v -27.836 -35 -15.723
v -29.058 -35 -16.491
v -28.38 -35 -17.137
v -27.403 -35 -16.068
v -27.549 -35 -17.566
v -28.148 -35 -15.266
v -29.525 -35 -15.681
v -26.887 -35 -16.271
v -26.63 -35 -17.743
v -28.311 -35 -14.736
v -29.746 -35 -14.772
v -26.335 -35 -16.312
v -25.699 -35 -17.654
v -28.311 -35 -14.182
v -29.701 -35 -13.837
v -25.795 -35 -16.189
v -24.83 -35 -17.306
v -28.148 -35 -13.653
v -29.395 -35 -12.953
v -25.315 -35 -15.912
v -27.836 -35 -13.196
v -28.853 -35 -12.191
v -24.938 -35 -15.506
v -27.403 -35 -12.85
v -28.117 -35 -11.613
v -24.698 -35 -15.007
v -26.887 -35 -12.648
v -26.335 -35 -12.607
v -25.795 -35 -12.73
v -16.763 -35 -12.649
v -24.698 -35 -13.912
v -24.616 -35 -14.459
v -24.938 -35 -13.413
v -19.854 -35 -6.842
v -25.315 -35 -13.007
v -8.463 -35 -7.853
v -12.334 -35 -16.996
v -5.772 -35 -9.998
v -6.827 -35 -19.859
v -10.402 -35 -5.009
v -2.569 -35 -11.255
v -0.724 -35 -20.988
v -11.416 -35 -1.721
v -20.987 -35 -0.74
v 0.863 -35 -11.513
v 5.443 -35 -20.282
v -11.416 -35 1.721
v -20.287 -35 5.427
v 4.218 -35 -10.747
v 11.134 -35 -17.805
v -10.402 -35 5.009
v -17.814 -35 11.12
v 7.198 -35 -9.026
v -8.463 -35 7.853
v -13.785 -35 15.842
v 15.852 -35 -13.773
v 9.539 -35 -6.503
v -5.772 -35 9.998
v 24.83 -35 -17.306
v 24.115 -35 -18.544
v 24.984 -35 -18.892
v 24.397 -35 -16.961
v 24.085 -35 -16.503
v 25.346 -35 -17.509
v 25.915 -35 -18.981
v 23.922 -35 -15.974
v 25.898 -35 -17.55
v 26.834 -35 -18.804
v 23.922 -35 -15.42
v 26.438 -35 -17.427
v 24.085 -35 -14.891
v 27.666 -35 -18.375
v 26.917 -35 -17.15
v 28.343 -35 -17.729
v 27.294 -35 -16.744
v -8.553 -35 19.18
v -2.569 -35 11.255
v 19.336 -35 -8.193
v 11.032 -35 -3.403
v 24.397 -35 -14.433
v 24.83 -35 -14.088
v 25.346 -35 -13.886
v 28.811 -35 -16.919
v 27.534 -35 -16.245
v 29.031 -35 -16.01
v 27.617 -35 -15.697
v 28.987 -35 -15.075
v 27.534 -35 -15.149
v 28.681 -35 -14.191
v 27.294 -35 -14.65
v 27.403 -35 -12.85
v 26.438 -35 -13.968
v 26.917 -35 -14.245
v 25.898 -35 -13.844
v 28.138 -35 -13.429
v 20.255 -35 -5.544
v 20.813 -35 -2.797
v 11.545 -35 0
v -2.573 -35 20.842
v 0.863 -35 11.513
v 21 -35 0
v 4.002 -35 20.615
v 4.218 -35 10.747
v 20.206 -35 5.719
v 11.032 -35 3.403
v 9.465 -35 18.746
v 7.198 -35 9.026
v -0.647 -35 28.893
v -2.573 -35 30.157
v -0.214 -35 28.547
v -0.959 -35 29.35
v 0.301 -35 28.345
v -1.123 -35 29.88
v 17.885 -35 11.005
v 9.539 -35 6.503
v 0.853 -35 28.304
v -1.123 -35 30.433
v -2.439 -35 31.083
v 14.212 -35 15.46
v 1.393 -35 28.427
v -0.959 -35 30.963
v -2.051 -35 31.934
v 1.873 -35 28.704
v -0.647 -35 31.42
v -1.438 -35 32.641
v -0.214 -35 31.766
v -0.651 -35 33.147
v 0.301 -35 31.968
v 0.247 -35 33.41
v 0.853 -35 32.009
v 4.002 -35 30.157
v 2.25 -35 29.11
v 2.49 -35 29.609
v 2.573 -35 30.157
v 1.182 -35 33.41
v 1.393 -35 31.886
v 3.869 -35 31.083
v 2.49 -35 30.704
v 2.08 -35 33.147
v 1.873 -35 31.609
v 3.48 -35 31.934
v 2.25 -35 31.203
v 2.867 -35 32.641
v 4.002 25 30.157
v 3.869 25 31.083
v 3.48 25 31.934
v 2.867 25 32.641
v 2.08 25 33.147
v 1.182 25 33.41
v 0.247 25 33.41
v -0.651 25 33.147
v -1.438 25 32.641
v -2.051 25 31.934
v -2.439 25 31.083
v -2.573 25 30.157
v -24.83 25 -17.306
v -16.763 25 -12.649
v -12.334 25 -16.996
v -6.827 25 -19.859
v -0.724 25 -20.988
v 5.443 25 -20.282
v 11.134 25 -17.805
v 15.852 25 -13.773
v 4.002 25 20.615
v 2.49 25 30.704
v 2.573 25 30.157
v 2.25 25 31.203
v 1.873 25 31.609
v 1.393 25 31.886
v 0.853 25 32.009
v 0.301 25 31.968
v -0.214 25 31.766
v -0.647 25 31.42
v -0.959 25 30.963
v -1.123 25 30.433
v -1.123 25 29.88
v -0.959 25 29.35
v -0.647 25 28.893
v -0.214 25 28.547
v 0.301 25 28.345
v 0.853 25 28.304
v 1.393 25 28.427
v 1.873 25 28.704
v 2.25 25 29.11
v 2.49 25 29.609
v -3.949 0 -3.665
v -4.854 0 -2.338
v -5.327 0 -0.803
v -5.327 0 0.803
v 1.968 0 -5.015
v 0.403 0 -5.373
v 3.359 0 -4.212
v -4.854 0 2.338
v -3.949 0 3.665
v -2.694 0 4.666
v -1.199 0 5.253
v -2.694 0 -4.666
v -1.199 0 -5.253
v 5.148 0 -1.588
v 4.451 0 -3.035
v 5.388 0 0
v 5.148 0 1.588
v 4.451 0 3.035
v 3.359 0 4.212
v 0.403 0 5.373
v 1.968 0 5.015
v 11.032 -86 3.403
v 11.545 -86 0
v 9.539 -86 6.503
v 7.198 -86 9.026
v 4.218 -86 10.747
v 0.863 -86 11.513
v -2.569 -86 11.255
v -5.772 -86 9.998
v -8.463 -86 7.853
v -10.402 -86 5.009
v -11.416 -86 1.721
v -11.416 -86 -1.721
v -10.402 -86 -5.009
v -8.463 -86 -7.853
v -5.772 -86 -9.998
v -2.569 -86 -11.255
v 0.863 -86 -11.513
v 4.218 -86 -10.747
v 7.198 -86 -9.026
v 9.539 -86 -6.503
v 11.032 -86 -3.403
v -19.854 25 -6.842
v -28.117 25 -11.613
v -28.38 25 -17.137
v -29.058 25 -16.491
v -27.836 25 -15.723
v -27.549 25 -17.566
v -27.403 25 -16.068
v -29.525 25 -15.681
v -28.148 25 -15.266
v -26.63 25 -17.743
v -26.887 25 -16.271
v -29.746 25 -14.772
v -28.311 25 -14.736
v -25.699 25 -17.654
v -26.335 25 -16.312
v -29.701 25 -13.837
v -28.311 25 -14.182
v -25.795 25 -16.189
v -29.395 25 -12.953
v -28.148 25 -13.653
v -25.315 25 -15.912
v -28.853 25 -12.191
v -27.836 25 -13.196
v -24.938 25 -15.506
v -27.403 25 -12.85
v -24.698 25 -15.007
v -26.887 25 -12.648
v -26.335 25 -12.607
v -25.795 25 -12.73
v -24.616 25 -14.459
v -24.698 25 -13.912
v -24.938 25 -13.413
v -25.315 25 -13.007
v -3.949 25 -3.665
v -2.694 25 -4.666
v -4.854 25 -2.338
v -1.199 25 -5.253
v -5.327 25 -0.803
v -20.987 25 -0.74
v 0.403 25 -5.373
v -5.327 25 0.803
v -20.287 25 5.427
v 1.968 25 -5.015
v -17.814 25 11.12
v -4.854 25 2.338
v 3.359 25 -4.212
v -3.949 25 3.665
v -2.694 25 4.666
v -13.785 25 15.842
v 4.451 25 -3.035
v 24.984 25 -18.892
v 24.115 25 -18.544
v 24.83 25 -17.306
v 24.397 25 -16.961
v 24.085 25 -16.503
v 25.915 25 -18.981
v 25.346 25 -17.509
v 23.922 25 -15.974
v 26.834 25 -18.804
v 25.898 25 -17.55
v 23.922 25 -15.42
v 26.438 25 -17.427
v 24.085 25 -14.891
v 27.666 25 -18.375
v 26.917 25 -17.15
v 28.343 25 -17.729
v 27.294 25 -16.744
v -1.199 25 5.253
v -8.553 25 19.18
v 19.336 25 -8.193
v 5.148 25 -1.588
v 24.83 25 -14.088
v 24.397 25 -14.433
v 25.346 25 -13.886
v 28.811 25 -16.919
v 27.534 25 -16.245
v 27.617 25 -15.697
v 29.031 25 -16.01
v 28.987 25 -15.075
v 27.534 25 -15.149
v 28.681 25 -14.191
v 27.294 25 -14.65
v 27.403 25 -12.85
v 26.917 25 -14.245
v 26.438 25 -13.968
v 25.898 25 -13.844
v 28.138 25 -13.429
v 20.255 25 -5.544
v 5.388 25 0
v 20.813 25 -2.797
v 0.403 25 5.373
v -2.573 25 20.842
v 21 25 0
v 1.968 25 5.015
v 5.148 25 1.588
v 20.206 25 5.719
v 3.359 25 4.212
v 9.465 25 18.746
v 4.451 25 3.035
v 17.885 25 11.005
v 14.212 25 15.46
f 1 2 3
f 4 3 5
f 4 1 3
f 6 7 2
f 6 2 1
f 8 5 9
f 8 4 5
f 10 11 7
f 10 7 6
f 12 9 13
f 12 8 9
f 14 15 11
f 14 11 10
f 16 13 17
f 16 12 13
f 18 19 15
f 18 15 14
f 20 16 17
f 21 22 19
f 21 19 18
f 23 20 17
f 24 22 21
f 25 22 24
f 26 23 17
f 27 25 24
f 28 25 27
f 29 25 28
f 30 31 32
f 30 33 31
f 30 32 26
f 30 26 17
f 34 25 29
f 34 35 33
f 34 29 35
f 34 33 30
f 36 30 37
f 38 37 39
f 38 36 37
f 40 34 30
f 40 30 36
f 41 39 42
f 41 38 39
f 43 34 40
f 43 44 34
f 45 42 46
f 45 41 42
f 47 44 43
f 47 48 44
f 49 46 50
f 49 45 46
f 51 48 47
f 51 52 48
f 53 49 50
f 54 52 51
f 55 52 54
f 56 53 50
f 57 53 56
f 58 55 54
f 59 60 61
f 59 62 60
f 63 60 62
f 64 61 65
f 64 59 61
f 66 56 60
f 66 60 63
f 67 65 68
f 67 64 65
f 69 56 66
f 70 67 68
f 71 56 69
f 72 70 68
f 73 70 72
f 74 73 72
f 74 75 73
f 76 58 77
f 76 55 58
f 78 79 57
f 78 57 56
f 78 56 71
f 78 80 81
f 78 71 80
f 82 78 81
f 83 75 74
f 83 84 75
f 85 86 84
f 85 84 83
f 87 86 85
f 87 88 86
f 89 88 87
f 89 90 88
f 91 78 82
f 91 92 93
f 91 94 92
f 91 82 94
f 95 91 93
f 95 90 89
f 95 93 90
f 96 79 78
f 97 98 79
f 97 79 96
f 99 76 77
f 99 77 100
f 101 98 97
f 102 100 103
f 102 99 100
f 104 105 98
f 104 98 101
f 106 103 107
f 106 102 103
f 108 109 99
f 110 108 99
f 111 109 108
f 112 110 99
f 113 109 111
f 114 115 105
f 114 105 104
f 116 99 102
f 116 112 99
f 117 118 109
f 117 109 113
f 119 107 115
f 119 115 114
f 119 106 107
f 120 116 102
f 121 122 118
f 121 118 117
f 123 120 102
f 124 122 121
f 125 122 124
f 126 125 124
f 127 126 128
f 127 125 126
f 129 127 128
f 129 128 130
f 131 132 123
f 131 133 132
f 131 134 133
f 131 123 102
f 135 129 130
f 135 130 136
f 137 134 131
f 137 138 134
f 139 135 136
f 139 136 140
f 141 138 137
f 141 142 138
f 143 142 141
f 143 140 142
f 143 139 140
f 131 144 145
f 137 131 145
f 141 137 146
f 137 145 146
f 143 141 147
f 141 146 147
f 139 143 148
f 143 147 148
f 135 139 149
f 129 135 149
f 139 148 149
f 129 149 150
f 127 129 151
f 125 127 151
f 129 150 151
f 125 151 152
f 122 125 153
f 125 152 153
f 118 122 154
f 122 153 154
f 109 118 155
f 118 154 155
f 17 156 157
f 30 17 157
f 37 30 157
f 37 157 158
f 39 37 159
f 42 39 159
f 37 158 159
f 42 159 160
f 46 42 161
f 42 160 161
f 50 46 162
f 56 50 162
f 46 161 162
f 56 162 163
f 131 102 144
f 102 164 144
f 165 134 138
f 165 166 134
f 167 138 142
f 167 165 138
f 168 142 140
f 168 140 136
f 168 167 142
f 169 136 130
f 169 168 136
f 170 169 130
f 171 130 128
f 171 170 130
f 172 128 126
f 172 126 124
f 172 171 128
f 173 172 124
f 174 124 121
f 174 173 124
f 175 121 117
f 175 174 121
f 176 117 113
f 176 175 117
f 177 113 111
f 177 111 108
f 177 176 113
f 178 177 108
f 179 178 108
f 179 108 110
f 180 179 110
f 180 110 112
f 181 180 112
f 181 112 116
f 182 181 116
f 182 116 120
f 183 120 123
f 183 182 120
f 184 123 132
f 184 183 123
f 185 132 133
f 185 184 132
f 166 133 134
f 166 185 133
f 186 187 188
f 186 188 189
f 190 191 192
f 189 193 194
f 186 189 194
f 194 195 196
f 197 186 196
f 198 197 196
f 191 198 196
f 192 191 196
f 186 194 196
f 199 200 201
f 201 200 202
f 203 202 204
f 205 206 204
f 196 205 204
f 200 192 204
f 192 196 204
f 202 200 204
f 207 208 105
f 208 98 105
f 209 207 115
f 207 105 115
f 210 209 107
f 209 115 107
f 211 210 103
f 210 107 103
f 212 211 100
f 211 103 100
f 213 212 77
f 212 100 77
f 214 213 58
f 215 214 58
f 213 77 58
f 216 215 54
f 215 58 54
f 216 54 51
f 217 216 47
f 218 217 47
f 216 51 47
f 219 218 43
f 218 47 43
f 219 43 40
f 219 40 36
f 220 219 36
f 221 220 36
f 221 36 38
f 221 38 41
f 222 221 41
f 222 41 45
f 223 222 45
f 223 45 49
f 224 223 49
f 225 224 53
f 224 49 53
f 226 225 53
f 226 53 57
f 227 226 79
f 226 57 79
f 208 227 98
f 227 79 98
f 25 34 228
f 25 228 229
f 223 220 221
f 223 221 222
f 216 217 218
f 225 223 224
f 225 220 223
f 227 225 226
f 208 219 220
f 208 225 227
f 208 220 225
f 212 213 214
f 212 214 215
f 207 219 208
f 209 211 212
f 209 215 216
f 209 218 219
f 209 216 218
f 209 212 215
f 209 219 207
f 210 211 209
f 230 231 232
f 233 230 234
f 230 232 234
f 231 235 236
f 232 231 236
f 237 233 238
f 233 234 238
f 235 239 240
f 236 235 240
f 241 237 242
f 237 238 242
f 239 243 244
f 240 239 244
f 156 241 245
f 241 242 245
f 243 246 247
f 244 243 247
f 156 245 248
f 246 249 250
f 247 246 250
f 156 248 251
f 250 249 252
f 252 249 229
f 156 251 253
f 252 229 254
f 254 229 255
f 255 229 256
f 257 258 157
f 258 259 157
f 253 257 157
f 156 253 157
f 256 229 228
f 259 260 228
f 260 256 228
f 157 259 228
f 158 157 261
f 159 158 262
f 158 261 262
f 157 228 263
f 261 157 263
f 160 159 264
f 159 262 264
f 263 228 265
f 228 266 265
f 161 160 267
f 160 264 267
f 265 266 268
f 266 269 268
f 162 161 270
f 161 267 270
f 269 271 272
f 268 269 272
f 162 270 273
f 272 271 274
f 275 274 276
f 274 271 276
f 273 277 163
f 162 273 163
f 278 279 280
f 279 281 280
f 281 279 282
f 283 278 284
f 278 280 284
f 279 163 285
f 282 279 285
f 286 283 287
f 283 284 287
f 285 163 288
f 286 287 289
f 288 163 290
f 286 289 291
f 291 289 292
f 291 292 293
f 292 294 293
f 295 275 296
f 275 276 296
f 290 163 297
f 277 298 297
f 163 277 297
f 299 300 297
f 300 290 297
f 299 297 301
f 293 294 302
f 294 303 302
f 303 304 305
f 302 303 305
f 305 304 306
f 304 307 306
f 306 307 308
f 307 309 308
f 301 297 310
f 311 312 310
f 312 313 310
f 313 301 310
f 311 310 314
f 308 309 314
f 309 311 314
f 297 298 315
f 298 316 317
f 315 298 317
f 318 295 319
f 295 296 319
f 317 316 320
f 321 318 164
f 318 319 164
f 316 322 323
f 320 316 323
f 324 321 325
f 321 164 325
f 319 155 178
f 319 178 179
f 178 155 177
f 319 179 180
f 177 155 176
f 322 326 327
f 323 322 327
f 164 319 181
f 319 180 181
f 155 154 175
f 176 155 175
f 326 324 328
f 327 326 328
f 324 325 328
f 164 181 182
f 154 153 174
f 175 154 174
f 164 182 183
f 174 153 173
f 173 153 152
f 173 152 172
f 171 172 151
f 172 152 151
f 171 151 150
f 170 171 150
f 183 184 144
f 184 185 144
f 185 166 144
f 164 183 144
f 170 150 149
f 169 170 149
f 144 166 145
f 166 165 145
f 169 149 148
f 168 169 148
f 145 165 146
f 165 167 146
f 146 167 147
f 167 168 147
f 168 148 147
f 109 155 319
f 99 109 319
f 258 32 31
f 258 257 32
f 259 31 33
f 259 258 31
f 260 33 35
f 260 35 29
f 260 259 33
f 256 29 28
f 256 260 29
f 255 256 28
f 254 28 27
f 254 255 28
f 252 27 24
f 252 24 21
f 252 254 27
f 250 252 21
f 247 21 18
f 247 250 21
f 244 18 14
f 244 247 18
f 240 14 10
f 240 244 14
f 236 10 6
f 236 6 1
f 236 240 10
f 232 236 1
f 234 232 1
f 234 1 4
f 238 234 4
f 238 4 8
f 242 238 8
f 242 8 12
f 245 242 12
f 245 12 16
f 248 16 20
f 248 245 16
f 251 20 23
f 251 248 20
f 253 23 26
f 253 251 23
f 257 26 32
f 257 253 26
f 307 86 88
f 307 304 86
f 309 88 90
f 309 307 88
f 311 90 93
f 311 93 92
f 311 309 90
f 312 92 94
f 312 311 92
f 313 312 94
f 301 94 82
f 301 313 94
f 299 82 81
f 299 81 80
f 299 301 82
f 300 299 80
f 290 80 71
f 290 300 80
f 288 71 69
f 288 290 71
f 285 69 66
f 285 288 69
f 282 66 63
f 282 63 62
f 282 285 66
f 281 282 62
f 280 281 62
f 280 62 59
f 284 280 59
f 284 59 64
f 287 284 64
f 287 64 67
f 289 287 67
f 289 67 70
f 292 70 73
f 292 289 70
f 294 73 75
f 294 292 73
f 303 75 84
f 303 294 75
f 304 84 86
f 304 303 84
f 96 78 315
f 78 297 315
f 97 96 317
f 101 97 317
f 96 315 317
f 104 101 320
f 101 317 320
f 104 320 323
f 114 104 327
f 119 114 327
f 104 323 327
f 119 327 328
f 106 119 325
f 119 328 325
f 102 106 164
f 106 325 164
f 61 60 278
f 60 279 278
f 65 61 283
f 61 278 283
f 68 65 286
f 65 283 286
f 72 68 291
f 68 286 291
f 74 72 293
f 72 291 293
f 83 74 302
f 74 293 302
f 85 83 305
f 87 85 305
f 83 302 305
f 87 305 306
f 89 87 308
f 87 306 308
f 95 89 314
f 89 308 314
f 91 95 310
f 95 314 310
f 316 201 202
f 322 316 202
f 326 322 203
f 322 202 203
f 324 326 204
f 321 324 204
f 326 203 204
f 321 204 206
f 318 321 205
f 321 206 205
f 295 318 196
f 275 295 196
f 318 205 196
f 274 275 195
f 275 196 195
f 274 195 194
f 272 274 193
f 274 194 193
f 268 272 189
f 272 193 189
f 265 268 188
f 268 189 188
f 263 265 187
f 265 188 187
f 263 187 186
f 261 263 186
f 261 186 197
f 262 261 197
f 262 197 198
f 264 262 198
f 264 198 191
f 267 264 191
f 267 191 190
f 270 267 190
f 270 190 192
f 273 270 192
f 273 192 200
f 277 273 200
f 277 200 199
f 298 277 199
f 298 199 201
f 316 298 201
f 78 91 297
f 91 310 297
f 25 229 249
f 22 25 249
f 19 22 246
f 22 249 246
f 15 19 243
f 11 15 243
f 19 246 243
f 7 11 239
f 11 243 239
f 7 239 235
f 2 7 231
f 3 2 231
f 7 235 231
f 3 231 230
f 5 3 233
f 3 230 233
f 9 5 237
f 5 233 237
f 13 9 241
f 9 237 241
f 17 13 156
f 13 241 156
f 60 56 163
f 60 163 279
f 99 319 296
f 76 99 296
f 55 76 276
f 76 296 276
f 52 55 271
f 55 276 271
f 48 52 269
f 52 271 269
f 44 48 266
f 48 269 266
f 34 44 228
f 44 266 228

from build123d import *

# Parameters (mm, degrees)
F0_R      = 1.8579854111
F1_DEPTH  = 25
F2_DEPTH  = 25
F3_R      = 11.5448753259
F4_DEPTH  = 80
F5_DEPTH  = 3
F6_DEPTH  = 3
F7_R      = 5.3876087587
F8_DEPTH  = 25.001
F9_DEPTH  = 3
F10_DEPTH = 1
F11_DEPTH = 3


with BuildPart() as f1:
    # F0 (on Front) → F1 (new body)
    with BuildSketch(Plane.XZ):
        with BuildLine():
            ThreePointArc((19.3358495207, -8.192980124), (20.5797575294, -4.1801411498), (21, 0))
            ThreePointArc((21, 0), (16.2024401229, 13.3596756721), (4.0018158033, 20.6151757275))
            ThreePointArc((4.0018158033, 20.6151757275), (0.7235399919, 20.987531772), (-2.5725958403, 20.8418269507))
            ThreePointArc((-2.5725958403, 20.8418269507), (-17.8139656813, 11.1203698997), (-19.8541737852, -6.8419137168))
            ThreePointArc((-19.8541737852, -6.8419137168), (-18.5375056732, -9.8671618723), (-16.7632536804, -12.6488468267))
            ThreePointArc((-16.7632536804, -12.6488468267), (-0.7235399919, -20.987531772), (15.8523579818, -13.7732620107))
            ThreePointArc((15.8523579818, -13.7732620107), (17.8139656813, -11.1203698997), (19.3358495207, -8.192980124))
        make_face()
        with BuildLine():
            ThreePointArc((-2.5725958403, 20.8418269507), (0.7235399919, 20.987531772), (4.0018158033, 20.6151757275))
            Line((4.0018158033, 20.6151757275), (4.0018158033, 30.1565360278))
            ThreePointArc((4.0018158033, 30.1565360278), (0.7146099815, 33.4437418496), (-2.5725958403, 30.1565360278))
            Line((-2.5725958403, 30.1565360278), (-2.5725958403, 20.8418269507))
        make_face()
        with Locations((0.7146099815, 30.1565360278)):
            Circle(F0_R, mode=Mode.SUBTRACT)
        with BuildLine():
            ThreePointArc((-16.7632536804, -12.6488468267), (-18.5375056732, -9.8671618723), (-19.8541737852, -6.8419137168))
            Line((-19.8541737852, -6.8419137168), (-28.1172341919, -11.6125938669))
            ThreePointArc((-28.1172341919, -11.6125938669), (-29.3204350301, -16.103000527), (-24.83002837, -17.3062013653))
            Line((-24.83002837, -17.3062013653), (-16.7632536804, -12.6488468267))
        make_face()
        with Locations((-26.473631281, -14.4593976161)):
            Circle(F0_R, mode=Mode.SUBTRACT)
        with BuildLine():
            Line((27.4026242104, -12.8503346625), (19.3358495207, -8.192980124))
            ThreePointArc((19.3358495207, -8.192980124), (17.8139656813, -11.1203698997), (15.8523579818, -13.7732620107))
            Line((15.8523579818, -13.7732620107), (24.1154183885, -18.5439421609))
            ThreePointArc((24.1154183885, -18.5439421609), (28.6058250486, -17.3407413226), (27.4026242104, -12.8503346625))
        make_face()
        with Locations((25.7590212994, -15.6971384117)):
            Circle(F0_R, mode=Mode.SUBTRACT)
    extrude(amount=F1_DEPTH)

    # F2 (add): faces of the model
    f2_faces = [f1.faces().sort_by_distance(p)[0] for p in [
        (0, 0, 0),
        (0, -25, 0),
    ]]
    extrude(f2_faces, amount=F2_DEPTH, dir=(0, 1, 0))

    # F3 (on Front) → F4 (join)
    with BuildSketch(Plane.XZ):
        Circle(F3_R)
    extrude(amount=F4_DEPTH)

    # F5 (add): faces of the model
    f5_faces = [f1.faces().sort_by_distance(p)[0] for p in [
        (0, -80, 0),
        (-1.771197573, -25, 25.4991814892),
    ]]
    extrude(f5_faces, amount=F5_DEPTH)

    # F6 (add): a face of the model
    f6_faces = [f1.faces().sort_by_distance(p)[0] for p in [
        (-1.771197573, -28, 25.4991814892),
    ]]
    extrude(f6_faces, amount=F6_DEPTH)

    # F7 (on Front) → F8 (cut, through all)
    with BuildSketch(Plane.XZ):
        Circle(F7_R)
    extrude(amount=-F8_DEPTH, mode=Mode.SUBTRACT)

    # F9 (add): a face of the model
    f9_faces = [f1.faces().sort_by_distance(p)[0] for p in [
        (-1.771197573, -31, 25.4991814892),
    ]]
    extrude(f9_faces, amount=F9_DEPTH)

    # F10 (add): a face of the model
    f10_faces = [f1.faces().sort_by_distance(p)[0] for p in [
        (-1.771197573, -34, 25.4991814892),
    ]]
    extrude(f10_faces, amount=F10_DEPTH)

    # F11 (add): a face of the model
    f11_faces = [f1.faces().sort_by_distance(p)[0] for p in [
        (0, -83, 0),
    ]]
    extrude(f11_faces, amount=F11_DEPTH)


solid = f1.part
